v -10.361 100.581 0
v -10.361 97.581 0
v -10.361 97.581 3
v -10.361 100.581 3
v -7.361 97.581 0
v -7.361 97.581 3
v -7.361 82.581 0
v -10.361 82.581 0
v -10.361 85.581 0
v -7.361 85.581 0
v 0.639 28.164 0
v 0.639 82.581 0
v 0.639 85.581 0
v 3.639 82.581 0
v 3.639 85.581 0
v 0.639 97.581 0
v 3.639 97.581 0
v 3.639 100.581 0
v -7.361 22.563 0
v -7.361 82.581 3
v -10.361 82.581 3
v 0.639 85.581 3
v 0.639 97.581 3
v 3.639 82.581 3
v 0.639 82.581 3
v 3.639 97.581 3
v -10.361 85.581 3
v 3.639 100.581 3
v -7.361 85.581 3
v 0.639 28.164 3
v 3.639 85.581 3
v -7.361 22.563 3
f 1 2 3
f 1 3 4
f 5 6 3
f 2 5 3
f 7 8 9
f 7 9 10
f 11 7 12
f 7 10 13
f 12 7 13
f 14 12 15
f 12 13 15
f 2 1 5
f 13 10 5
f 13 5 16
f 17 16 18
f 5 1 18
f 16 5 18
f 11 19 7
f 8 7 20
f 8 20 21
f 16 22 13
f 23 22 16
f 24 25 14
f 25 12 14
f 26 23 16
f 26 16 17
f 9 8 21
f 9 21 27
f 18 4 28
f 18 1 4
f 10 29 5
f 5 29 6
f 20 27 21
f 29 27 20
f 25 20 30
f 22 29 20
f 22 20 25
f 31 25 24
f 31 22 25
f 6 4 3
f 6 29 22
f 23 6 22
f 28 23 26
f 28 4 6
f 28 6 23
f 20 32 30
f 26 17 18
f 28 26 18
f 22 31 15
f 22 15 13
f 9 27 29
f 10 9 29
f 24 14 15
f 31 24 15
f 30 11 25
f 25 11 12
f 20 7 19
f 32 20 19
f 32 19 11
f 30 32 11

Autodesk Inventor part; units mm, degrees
ref_plane "YZ Plane" through (0, 0, 0) normal (1, 0, 0) x (0, 1, 0)
ref_plane "XZ Plane" through (0, 0, 0) normal (0, 1, 0) x (-1, 0, 0)
ref_plane "XY Plane" through (0, 0, 0) normal (0, 0, 1) x (1, 0, 0)
sketch "Sketch2" plane through (0, 0, 0) normal (0, 0, 1) x (1, 0, 0)
  line L0 (-7.3607, 82.5814) -> (-7.3607, 22.5627)
  line L1 (-7.3607, 22.5627) -> (0.6393, 28.1644)
  line L2 (0.6393, 28.1644) -> (0.6393, 82.5814)
  line L3 (-7.3607, 82.5814) -> (-10.3607, 82.5814)
  line L4 (-10.3607, 82.5814) -> (-10.3607, 100.5814)
  line L5 (0.6393, 82.5814) -> (3.6393, 82.5814)
  line L6 (3.6393, 82.5814) -> (3.6393, 100.5814)
  line L7 (-10.3607, 100.5814) -> (3.6393, 100.5814)
  line L8 (-10.3607, 85.5814) -> (3.6393, 85.5814) construction
  point P0 (0, 0)
  dimension "d3" = 125
  dimension "d9" = 8
  dimension "d10" = 18
  dimension "d11" = 3
  dimension "d12" = 57.417
  dimension "d13" = 3
  dimension "d14" = 18
extrude "Extrusion1" add sketch "Sketch2" along normal blind 3
sketch "Sketch3" plane through (0, 0, 3) normal (0, 0, 1) x (1, 0, 0)
  line L0 (-10.3607, 100.5814) -> (-10.3607, 82.5814) projected
  line L1 (3.6393, 82.5814) -> (3.6393, 100.5814) projected
  line L2 (-10.3607, 85.5814) -> (-7.3607, 85.5814)
  line L3 (-7.3607, 85.5814) -> (-7.3607, 97.5814)
  line L4 (-7.3607, 97.5814) -> (-10.3607, 97.5814)
  line L5 (-10.3607, 97.5814) -> (-10.3607, 85.5814)
  line L6 (3.6393, 85.5814) -> (0.6393, 85.5814)
  line L7 (0.6393, 85.5814) -> (0.6393, 97.5814)
  line L8 (0.6393, 97.5814) -> (3.6393, 97.5814)
  line L9 (3.6393, 97.5814) -> (3.6393, 85.5814)
  point P0 (0, 0)
  dimension "d15" = 3
  dimension "d16" = 12
  dimension "d17" = 3
extrude "Extrusion2" cut sketch "Sketch3" against normal through all
equation "\"d14\" = d10"
properties part number "k2_t_leg"
